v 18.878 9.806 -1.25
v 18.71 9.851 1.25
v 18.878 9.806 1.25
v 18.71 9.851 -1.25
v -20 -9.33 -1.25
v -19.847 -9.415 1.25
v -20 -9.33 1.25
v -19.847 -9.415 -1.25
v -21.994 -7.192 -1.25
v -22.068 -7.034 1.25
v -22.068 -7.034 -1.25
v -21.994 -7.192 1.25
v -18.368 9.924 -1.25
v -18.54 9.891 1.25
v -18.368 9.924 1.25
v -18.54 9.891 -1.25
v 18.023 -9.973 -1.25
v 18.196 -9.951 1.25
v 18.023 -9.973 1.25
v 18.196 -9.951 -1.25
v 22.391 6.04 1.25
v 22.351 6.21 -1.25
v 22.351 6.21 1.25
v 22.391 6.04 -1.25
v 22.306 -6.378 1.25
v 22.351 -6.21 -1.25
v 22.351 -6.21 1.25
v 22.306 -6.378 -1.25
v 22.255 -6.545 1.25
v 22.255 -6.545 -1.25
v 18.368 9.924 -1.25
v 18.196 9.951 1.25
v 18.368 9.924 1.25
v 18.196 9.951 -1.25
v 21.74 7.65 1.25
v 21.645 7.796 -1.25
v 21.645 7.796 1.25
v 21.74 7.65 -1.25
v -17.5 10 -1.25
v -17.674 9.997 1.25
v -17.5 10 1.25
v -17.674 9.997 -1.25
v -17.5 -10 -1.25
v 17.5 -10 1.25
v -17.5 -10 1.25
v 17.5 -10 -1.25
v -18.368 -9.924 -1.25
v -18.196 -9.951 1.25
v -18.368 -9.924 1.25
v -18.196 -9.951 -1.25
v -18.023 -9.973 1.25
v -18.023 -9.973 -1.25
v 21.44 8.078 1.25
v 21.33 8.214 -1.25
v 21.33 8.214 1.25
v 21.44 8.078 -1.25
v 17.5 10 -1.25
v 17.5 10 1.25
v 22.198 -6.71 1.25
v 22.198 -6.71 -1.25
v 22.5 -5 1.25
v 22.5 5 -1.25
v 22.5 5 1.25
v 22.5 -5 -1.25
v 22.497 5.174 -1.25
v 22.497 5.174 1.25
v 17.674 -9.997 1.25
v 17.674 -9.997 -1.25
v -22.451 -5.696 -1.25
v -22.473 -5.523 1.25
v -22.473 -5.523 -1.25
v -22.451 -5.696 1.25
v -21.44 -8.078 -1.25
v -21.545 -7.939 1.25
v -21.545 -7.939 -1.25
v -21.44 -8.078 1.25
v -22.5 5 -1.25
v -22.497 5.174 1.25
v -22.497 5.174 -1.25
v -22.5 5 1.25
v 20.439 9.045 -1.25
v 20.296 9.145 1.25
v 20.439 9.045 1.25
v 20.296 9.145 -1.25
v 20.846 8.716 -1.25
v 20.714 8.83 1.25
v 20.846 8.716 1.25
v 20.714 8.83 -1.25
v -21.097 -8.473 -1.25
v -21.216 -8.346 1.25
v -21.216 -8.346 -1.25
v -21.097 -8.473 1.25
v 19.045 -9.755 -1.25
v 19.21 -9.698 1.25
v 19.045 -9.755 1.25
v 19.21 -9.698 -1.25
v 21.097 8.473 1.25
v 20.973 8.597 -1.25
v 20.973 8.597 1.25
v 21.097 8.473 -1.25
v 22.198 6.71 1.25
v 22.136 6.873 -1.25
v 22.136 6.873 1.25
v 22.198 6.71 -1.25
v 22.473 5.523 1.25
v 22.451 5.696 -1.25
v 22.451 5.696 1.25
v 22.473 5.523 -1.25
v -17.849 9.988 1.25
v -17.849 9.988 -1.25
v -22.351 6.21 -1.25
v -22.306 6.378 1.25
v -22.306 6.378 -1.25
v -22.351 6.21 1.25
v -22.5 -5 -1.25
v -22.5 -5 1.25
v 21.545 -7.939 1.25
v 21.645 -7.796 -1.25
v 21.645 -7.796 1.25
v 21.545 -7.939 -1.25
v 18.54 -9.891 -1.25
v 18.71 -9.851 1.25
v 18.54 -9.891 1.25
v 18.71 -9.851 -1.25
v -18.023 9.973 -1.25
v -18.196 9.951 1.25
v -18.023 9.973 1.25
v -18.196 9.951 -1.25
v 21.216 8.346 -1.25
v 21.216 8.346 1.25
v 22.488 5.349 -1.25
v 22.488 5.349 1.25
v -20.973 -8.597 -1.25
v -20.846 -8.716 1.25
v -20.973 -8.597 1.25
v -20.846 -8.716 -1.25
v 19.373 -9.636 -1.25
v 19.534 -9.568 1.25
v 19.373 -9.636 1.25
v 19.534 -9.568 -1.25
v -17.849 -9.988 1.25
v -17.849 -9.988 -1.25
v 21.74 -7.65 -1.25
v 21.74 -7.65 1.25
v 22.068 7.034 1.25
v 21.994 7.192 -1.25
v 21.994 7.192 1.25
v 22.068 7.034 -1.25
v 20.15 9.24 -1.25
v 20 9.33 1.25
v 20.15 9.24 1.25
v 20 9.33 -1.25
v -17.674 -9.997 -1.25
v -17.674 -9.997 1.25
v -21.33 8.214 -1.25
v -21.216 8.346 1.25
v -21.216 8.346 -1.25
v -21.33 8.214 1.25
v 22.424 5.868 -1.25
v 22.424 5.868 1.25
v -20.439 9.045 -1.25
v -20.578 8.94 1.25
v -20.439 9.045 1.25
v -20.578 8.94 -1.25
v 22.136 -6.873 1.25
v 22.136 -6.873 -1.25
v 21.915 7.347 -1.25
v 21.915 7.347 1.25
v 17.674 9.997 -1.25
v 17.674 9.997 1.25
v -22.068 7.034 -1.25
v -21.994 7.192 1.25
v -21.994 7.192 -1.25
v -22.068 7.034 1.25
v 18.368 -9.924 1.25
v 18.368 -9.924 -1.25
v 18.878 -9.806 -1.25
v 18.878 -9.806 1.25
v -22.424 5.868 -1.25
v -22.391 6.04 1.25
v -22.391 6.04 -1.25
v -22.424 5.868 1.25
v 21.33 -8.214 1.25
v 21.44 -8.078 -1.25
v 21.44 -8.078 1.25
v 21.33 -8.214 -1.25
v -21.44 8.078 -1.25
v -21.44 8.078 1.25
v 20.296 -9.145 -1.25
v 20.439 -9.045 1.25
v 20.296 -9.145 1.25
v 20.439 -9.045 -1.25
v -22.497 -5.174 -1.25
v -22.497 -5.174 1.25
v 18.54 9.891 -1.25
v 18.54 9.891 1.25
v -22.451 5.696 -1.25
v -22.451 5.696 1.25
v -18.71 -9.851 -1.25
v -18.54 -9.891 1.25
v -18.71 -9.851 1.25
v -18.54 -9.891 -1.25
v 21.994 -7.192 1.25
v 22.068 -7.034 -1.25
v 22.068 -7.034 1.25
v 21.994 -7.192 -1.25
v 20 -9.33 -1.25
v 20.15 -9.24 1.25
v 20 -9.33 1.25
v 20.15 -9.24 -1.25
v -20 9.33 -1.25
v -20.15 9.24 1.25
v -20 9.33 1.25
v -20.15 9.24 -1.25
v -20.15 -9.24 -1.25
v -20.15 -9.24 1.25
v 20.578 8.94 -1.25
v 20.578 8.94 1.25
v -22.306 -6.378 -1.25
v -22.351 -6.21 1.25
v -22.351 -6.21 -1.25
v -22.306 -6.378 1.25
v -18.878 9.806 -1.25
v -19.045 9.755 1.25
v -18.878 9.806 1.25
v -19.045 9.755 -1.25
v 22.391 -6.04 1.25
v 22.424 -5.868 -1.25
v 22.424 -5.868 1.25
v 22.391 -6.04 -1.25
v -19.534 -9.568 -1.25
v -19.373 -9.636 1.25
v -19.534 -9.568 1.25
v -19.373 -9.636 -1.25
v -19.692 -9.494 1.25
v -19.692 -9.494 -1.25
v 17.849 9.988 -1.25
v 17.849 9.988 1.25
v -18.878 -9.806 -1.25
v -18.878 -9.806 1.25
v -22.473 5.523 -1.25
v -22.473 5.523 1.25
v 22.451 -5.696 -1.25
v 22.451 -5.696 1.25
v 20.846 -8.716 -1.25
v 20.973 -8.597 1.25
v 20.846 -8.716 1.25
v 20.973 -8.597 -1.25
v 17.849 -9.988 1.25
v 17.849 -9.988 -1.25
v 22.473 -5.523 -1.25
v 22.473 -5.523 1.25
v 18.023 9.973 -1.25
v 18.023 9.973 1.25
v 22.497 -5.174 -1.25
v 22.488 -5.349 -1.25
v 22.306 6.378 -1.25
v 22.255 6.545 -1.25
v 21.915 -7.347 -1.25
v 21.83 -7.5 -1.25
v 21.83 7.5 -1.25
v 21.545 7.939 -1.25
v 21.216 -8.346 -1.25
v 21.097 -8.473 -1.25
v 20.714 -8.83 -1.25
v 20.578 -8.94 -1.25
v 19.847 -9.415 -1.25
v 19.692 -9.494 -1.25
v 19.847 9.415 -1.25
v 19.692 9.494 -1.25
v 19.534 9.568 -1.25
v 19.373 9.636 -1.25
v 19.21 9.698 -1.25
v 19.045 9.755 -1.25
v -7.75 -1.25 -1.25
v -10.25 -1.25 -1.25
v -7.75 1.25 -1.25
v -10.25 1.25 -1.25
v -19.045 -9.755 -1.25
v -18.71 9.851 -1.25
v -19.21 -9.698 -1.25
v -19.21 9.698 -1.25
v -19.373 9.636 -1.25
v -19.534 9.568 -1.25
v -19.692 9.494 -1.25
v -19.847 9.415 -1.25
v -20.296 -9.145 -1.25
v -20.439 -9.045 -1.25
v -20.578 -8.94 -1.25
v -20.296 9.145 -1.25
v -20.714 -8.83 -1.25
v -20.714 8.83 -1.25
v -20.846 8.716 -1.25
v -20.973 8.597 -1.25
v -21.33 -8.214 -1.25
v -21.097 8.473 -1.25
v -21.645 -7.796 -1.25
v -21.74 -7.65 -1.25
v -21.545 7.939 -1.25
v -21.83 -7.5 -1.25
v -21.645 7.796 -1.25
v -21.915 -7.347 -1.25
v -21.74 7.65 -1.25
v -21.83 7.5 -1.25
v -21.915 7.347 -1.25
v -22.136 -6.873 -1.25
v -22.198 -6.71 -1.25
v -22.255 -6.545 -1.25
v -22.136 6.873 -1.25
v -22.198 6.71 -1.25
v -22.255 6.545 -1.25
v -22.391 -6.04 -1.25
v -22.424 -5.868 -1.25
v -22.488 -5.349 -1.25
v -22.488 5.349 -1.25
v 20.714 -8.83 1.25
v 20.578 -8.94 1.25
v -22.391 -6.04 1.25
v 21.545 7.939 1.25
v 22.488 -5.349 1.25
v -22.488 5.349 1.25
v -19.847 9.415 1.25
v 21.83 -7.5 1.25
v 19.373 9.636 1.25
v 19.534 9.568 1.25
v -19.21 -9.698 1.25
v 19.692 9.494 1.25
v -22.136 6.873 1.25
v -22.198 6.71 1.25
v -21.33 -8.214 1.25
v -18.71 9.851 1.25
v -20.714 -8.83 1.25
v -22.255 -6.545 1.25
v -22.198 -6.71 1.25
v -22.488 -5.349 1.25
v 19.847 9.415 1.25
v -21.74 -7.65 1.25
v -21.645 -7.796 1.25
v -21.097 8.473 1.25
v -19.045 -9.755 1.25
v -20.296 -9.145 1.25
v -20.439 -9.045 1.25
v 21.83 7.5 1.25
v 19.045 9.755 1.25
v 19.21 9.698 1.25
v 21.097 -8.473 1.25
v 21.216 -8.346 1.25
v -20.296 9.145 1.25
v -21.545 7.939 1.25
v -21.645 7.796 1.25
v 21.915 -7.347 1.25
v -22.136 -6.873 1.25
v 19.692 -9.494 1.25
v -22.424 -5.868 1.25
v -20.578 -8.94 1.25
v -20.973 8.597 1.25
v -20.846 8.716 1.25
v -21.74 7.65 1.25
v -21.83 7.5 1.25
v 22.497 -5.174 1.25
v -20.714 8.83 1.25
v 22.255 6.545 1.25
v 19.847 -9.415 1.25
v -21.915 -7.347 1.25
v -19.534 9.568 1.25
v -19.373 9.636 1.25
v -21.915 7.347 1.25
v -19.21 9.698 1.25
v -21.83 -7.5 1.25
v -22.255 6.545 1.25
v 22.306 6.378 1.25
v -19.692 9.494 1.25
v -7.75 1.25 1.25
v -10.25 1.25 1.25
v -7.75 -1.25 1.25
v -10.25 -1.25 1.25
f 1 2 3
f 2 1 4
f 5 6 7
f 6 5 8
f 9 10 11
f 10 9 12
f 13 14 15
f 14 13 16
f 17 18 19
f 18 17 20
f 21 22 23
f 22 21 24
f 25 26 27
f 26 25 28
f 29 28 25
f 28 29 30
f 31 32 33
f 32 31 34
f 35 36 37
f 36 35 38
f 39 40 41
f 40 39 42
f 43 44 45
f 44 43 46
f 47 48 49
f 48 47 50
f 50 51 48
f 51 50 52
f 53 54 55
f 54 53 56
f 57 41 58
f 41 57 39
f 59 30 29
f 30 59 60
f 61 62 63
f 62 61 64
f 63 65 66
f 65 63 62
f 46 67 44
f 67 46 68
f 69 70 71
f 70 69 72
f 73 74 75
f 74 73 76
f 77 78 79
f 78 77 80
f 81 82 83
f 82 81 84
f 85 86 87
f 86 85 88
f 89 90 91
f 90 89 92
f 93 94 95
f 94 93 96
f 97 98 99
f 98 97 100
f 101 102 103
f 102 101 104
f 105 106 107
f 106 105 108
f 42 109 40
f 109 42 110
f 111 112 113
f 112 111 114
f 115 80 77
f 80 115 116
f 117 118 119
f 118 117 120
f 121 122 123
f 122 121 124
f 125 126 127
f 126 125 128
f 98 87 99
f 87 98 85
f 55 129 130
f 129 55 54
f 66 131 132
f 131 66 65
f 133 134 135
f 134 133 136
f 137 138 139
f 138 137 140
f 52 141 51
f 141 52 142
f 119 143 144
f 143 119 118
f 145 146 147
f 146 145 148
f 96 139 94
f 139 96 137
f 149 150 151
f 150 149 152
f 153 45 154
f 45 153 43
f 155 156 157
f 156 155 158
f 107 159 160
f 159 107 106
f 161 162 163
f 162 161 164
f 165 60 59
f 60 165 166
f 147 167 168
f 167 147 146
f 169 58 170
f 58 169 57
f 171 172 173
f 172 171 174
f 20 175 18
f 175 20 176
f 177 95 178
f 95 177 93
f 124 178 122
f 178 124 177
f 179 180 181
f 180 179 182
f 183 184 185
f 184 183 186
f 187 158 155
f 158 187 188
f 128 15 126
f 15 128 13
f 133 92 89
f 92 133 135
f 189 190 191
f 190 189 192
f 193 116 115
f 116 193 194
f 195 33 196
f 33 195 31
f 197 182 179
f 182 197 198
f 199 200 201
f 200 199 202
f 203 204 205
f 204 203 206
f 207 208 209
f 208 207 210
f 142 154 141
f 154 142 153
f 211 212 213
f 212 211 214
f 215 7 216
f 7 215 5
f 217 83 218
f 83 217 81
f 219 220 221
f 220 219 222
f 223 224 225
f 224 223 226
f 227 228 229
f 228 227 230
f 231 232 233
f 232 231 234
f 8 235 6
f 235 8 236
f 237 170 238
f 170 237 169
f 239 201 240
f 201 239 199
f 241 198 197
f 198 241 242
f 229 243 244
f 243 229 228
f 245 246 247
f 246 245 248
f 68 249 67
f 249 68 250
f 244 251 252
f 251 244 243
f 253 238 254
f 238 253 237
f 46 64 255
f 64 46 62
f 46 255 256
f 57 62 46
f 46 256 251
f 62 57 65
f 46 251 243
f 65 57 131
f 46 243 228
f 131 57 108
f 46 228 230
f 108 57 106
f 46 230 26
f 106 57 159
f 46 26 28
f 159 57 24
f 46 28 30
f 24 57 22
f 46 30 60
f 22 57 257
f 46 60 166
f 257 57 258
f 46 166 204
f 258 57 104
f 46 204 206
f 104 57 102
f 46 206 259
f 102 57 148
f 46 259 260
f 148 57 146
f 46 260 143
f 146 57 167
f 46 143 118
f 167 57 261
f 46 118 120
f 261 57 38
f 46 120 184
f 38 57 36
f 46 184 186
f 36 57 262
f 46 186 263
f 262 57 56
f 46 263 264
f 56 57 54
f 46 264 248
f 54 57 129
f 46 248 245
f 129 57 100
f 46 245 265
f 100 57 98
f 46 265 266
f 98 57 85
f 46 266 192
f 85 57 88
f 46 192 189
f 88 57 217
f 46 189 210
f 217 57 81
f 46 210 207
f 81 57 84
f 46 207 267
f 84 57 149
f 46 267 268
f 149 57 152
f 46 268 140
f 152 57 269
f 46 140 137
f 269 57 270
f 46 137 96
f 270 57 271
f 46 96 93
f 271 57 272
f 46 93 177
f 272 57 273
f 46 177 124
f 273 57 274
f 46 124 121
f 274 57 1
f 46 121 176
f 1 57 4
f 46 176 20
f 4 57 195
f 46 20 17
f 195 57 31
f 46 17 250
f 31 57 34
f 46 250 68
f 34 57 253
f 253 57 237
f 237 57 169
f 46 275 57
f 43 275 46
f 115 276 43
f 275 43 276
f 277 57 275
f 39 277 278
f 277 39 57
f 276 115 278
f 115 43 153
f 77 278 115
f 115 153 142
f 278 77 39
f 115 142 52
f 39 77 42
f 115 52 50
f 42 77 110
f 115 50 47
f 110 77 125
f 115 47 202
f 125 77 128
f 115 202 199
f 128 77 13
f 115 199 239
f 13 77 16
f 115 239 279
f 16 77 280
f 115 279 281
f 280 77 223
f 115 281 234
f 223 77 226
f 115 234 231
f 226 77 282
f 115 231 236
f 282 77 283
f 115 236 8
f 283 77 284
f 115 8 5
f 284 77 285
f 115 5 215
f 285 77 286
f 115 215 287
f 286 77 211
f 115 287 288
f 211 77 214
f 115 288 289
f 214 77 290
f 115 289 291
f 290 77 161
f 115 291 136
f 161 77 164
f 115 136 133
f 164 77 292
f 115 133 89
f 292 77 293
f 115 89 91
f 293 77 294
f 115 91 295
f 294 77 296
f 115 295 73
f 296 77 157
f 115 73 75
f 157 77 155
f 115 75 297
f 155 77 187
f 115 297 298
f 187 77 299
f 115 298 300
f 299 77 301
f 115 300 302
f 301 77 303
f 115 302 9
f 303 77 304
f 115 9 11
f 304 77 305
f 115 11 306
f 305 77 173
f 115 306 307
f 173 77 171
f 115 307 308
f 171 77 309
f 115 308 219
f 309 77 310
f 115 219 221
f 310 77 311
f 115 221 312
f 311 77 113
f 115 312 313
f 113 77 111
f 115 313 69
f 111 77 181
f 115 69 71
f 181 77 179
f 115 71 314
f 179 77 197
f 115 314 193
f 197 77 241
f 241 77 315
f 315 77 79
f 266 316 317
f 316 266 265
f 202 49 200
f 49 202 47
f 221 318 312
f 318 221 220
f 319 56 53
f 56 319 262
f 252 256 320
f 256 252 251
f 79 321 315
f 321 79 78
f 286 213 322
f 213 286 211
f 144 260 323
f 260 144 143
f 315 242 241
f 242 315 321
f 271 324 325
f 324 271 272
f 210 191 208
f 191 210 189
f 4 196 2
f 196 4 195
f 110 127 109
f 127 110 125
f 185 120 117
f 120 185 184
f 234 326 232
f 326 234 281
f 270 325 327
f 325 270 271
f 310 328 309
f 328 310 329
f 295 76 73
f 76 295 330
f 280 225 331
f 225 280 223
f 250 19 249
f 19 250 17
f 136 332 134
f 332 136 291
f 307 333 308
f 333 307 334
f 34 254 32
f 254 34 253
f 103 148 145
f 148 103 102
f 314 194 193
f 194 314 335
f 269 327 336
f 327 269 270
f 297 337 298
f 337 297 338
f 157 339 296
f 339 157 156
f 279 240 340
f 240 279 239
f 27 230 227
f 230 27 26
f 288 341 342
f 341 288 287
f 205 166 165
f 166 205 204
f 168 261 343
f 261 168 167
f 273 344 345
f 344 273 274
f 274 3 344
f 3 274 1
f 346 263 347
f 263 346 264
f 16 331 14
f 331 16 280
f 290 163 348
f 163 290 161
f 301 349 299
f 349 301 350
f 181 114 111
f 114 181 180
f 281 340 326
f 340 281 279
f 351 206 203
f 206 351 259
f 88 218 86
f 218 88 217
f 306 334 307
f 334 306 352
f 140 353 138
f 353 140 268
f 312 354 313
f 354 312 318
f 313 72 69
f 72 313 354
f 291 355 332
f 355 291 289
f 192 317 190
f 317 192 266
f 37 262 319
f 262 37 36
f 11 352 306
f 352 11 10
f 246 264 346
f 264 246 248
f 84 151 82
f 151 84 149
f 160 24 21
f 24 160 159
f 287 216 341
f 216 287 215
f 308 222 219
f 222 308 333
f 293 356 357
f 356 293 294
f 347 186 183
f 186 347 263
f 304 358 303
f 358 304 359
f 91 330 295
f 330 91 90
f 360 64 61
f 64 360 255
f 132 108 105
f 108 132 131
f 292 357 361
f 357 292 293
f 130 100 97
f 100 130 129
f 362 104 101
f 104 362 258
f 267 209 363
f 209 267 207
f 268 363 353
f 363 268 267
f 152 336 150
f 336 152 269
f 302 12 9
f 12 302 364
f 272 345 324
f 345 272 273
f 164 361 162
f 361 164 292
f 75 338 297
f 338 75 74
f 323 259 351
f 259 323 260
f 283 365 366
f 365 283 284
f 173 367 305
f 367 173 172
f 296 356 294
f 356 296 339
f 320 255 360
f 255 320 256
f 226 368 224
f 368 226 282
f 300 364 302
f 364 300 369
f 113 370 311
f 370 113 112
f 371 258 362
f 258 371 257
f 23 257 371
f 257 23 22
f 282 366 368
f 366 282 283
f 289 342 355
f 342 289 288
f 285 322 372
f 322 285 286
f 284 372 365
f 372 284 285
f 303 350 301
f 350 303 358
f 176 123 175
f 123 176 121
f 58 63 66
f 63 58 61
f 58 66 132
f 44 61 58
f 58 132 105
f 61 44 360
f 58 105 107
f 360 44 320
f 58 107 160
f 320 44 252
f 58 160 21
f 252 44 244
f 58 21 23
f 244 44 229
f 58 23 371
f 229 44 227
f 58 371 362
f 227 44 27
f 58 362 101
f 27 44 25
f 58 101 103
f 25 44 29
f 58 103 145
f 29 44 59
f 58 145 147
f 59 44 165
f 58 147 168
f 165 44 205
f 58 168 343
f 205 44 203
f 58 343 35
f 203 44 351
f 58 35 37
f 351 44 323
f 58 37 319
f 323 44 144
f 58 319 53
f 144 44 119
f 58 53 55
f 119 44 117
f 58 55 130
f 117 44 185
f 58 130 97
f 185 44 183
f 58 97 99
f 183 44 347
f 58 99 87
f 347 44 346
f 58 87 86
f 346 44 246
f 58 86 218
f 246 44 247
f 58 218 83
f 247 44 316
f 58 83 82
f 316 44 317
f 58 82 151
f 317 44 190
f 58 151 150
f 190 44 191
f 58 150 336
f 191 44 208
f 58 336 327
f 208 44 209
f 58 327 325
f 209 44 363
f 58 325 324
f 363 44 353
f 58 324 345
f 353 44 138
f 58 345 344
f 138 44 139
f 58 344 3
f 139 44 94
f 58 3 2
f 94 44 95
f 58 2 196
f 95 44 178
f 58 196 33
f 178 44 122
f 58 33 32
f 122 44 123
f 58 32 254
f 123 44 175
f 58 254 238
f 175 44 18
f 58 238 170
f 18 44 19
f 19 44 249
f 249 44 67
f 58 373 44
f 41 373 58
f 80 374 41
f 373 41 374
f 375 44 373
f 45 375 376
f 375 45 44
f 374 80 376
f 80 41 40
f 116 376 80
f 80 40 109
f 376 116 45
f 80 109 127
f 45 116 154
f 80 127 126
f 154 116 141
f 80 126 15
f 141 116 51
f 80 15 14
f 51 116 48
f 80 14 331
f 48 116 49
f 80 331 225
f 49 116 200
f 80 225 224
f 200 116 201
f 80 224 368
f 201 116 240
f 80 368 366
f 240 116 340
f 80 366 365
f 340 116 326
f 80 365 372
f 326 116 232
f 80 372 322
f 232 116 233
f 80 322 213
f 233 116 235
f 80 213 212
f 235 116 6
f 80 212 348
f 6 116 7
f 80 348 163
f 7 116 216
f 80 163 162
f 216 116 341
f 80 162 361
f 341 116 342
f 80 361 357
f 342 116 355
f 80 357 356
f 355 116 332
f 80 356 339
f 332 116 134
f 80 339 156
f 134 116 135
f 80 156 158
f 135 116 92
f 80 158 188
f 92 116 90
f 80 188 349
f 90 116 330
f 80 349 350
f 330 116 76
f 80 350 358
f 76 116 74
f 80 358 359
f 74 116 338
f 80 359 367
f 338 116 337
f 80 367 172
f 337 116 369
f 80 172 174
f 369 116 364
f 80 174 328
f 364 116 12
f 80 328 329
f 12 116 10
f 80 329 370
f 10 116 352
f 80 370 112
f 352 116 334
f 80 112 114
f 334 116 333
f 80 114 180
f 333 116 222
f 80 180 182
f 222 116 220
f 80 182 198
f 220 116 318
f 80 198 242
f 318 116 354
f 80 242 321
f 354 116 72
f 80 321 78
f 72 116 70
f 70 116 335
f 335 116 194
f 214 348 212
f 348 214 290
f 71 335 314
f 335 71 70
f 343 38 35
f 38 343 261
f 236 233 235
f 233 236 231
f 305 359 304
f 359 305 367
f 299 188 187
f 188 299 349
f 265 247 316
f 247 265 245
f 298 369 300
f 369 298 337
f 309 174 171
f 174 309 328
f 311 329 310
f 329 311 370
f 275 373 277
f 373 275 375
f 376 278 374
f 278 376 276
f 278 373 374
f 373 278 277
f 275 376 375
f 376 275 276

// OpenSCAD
$fn = 180 * 1;

// The hole in the base will be a square with this length edges
hole_size = 2.5;

// Width of base
base_size_x = 45;

// Length of base
base_size_y = 20;

// Thickness of base
base_size_z = 2.5;

// Roundness of corners
base_roundness = 5;

// Offset the center of the hole this distance from the edge
hole_pos_x_rel = 13.5;

// Hole bevel depth - 0 to disable beveling
hole_bevel_depth = 0;

module roundedRect(size, radius)
{
    x = size[0];
    y = size[1];
    z = size[2];
    
    cylinder_z = 0.001;

    minkowski()
    {
        cube([x - radius * 2, y - radius * 2, z - cylinder_z], center = true);
        
        cylinder(r = radius, h = cylinder_z, center = true);
    }
}

difference()
{
    hole_pos_x_abs = base_size_x / -2 + hole_pos_x_rel;

    roundedRect([base_size_x, base_size_y, base_size_z], base_roundness);

    // Cut out a regular hole
    translate([hole_pos_x_abs, 0, 0])
    cube([hole_size, hole_size, base_size_z + 0.1], center = true);

    // Bevel the hole
    translate([hole_pos_x_abs, 0, base_size_z / 2 - hole_bevel_depth])
    minkowski()
    {
        translate([0, 0, 0.5])
        cube([hole_size, hole_size, 1], center = true);
        cylinder(r1 = 0, r2 = 1, h = 1, $fn = 4);
    }
}
